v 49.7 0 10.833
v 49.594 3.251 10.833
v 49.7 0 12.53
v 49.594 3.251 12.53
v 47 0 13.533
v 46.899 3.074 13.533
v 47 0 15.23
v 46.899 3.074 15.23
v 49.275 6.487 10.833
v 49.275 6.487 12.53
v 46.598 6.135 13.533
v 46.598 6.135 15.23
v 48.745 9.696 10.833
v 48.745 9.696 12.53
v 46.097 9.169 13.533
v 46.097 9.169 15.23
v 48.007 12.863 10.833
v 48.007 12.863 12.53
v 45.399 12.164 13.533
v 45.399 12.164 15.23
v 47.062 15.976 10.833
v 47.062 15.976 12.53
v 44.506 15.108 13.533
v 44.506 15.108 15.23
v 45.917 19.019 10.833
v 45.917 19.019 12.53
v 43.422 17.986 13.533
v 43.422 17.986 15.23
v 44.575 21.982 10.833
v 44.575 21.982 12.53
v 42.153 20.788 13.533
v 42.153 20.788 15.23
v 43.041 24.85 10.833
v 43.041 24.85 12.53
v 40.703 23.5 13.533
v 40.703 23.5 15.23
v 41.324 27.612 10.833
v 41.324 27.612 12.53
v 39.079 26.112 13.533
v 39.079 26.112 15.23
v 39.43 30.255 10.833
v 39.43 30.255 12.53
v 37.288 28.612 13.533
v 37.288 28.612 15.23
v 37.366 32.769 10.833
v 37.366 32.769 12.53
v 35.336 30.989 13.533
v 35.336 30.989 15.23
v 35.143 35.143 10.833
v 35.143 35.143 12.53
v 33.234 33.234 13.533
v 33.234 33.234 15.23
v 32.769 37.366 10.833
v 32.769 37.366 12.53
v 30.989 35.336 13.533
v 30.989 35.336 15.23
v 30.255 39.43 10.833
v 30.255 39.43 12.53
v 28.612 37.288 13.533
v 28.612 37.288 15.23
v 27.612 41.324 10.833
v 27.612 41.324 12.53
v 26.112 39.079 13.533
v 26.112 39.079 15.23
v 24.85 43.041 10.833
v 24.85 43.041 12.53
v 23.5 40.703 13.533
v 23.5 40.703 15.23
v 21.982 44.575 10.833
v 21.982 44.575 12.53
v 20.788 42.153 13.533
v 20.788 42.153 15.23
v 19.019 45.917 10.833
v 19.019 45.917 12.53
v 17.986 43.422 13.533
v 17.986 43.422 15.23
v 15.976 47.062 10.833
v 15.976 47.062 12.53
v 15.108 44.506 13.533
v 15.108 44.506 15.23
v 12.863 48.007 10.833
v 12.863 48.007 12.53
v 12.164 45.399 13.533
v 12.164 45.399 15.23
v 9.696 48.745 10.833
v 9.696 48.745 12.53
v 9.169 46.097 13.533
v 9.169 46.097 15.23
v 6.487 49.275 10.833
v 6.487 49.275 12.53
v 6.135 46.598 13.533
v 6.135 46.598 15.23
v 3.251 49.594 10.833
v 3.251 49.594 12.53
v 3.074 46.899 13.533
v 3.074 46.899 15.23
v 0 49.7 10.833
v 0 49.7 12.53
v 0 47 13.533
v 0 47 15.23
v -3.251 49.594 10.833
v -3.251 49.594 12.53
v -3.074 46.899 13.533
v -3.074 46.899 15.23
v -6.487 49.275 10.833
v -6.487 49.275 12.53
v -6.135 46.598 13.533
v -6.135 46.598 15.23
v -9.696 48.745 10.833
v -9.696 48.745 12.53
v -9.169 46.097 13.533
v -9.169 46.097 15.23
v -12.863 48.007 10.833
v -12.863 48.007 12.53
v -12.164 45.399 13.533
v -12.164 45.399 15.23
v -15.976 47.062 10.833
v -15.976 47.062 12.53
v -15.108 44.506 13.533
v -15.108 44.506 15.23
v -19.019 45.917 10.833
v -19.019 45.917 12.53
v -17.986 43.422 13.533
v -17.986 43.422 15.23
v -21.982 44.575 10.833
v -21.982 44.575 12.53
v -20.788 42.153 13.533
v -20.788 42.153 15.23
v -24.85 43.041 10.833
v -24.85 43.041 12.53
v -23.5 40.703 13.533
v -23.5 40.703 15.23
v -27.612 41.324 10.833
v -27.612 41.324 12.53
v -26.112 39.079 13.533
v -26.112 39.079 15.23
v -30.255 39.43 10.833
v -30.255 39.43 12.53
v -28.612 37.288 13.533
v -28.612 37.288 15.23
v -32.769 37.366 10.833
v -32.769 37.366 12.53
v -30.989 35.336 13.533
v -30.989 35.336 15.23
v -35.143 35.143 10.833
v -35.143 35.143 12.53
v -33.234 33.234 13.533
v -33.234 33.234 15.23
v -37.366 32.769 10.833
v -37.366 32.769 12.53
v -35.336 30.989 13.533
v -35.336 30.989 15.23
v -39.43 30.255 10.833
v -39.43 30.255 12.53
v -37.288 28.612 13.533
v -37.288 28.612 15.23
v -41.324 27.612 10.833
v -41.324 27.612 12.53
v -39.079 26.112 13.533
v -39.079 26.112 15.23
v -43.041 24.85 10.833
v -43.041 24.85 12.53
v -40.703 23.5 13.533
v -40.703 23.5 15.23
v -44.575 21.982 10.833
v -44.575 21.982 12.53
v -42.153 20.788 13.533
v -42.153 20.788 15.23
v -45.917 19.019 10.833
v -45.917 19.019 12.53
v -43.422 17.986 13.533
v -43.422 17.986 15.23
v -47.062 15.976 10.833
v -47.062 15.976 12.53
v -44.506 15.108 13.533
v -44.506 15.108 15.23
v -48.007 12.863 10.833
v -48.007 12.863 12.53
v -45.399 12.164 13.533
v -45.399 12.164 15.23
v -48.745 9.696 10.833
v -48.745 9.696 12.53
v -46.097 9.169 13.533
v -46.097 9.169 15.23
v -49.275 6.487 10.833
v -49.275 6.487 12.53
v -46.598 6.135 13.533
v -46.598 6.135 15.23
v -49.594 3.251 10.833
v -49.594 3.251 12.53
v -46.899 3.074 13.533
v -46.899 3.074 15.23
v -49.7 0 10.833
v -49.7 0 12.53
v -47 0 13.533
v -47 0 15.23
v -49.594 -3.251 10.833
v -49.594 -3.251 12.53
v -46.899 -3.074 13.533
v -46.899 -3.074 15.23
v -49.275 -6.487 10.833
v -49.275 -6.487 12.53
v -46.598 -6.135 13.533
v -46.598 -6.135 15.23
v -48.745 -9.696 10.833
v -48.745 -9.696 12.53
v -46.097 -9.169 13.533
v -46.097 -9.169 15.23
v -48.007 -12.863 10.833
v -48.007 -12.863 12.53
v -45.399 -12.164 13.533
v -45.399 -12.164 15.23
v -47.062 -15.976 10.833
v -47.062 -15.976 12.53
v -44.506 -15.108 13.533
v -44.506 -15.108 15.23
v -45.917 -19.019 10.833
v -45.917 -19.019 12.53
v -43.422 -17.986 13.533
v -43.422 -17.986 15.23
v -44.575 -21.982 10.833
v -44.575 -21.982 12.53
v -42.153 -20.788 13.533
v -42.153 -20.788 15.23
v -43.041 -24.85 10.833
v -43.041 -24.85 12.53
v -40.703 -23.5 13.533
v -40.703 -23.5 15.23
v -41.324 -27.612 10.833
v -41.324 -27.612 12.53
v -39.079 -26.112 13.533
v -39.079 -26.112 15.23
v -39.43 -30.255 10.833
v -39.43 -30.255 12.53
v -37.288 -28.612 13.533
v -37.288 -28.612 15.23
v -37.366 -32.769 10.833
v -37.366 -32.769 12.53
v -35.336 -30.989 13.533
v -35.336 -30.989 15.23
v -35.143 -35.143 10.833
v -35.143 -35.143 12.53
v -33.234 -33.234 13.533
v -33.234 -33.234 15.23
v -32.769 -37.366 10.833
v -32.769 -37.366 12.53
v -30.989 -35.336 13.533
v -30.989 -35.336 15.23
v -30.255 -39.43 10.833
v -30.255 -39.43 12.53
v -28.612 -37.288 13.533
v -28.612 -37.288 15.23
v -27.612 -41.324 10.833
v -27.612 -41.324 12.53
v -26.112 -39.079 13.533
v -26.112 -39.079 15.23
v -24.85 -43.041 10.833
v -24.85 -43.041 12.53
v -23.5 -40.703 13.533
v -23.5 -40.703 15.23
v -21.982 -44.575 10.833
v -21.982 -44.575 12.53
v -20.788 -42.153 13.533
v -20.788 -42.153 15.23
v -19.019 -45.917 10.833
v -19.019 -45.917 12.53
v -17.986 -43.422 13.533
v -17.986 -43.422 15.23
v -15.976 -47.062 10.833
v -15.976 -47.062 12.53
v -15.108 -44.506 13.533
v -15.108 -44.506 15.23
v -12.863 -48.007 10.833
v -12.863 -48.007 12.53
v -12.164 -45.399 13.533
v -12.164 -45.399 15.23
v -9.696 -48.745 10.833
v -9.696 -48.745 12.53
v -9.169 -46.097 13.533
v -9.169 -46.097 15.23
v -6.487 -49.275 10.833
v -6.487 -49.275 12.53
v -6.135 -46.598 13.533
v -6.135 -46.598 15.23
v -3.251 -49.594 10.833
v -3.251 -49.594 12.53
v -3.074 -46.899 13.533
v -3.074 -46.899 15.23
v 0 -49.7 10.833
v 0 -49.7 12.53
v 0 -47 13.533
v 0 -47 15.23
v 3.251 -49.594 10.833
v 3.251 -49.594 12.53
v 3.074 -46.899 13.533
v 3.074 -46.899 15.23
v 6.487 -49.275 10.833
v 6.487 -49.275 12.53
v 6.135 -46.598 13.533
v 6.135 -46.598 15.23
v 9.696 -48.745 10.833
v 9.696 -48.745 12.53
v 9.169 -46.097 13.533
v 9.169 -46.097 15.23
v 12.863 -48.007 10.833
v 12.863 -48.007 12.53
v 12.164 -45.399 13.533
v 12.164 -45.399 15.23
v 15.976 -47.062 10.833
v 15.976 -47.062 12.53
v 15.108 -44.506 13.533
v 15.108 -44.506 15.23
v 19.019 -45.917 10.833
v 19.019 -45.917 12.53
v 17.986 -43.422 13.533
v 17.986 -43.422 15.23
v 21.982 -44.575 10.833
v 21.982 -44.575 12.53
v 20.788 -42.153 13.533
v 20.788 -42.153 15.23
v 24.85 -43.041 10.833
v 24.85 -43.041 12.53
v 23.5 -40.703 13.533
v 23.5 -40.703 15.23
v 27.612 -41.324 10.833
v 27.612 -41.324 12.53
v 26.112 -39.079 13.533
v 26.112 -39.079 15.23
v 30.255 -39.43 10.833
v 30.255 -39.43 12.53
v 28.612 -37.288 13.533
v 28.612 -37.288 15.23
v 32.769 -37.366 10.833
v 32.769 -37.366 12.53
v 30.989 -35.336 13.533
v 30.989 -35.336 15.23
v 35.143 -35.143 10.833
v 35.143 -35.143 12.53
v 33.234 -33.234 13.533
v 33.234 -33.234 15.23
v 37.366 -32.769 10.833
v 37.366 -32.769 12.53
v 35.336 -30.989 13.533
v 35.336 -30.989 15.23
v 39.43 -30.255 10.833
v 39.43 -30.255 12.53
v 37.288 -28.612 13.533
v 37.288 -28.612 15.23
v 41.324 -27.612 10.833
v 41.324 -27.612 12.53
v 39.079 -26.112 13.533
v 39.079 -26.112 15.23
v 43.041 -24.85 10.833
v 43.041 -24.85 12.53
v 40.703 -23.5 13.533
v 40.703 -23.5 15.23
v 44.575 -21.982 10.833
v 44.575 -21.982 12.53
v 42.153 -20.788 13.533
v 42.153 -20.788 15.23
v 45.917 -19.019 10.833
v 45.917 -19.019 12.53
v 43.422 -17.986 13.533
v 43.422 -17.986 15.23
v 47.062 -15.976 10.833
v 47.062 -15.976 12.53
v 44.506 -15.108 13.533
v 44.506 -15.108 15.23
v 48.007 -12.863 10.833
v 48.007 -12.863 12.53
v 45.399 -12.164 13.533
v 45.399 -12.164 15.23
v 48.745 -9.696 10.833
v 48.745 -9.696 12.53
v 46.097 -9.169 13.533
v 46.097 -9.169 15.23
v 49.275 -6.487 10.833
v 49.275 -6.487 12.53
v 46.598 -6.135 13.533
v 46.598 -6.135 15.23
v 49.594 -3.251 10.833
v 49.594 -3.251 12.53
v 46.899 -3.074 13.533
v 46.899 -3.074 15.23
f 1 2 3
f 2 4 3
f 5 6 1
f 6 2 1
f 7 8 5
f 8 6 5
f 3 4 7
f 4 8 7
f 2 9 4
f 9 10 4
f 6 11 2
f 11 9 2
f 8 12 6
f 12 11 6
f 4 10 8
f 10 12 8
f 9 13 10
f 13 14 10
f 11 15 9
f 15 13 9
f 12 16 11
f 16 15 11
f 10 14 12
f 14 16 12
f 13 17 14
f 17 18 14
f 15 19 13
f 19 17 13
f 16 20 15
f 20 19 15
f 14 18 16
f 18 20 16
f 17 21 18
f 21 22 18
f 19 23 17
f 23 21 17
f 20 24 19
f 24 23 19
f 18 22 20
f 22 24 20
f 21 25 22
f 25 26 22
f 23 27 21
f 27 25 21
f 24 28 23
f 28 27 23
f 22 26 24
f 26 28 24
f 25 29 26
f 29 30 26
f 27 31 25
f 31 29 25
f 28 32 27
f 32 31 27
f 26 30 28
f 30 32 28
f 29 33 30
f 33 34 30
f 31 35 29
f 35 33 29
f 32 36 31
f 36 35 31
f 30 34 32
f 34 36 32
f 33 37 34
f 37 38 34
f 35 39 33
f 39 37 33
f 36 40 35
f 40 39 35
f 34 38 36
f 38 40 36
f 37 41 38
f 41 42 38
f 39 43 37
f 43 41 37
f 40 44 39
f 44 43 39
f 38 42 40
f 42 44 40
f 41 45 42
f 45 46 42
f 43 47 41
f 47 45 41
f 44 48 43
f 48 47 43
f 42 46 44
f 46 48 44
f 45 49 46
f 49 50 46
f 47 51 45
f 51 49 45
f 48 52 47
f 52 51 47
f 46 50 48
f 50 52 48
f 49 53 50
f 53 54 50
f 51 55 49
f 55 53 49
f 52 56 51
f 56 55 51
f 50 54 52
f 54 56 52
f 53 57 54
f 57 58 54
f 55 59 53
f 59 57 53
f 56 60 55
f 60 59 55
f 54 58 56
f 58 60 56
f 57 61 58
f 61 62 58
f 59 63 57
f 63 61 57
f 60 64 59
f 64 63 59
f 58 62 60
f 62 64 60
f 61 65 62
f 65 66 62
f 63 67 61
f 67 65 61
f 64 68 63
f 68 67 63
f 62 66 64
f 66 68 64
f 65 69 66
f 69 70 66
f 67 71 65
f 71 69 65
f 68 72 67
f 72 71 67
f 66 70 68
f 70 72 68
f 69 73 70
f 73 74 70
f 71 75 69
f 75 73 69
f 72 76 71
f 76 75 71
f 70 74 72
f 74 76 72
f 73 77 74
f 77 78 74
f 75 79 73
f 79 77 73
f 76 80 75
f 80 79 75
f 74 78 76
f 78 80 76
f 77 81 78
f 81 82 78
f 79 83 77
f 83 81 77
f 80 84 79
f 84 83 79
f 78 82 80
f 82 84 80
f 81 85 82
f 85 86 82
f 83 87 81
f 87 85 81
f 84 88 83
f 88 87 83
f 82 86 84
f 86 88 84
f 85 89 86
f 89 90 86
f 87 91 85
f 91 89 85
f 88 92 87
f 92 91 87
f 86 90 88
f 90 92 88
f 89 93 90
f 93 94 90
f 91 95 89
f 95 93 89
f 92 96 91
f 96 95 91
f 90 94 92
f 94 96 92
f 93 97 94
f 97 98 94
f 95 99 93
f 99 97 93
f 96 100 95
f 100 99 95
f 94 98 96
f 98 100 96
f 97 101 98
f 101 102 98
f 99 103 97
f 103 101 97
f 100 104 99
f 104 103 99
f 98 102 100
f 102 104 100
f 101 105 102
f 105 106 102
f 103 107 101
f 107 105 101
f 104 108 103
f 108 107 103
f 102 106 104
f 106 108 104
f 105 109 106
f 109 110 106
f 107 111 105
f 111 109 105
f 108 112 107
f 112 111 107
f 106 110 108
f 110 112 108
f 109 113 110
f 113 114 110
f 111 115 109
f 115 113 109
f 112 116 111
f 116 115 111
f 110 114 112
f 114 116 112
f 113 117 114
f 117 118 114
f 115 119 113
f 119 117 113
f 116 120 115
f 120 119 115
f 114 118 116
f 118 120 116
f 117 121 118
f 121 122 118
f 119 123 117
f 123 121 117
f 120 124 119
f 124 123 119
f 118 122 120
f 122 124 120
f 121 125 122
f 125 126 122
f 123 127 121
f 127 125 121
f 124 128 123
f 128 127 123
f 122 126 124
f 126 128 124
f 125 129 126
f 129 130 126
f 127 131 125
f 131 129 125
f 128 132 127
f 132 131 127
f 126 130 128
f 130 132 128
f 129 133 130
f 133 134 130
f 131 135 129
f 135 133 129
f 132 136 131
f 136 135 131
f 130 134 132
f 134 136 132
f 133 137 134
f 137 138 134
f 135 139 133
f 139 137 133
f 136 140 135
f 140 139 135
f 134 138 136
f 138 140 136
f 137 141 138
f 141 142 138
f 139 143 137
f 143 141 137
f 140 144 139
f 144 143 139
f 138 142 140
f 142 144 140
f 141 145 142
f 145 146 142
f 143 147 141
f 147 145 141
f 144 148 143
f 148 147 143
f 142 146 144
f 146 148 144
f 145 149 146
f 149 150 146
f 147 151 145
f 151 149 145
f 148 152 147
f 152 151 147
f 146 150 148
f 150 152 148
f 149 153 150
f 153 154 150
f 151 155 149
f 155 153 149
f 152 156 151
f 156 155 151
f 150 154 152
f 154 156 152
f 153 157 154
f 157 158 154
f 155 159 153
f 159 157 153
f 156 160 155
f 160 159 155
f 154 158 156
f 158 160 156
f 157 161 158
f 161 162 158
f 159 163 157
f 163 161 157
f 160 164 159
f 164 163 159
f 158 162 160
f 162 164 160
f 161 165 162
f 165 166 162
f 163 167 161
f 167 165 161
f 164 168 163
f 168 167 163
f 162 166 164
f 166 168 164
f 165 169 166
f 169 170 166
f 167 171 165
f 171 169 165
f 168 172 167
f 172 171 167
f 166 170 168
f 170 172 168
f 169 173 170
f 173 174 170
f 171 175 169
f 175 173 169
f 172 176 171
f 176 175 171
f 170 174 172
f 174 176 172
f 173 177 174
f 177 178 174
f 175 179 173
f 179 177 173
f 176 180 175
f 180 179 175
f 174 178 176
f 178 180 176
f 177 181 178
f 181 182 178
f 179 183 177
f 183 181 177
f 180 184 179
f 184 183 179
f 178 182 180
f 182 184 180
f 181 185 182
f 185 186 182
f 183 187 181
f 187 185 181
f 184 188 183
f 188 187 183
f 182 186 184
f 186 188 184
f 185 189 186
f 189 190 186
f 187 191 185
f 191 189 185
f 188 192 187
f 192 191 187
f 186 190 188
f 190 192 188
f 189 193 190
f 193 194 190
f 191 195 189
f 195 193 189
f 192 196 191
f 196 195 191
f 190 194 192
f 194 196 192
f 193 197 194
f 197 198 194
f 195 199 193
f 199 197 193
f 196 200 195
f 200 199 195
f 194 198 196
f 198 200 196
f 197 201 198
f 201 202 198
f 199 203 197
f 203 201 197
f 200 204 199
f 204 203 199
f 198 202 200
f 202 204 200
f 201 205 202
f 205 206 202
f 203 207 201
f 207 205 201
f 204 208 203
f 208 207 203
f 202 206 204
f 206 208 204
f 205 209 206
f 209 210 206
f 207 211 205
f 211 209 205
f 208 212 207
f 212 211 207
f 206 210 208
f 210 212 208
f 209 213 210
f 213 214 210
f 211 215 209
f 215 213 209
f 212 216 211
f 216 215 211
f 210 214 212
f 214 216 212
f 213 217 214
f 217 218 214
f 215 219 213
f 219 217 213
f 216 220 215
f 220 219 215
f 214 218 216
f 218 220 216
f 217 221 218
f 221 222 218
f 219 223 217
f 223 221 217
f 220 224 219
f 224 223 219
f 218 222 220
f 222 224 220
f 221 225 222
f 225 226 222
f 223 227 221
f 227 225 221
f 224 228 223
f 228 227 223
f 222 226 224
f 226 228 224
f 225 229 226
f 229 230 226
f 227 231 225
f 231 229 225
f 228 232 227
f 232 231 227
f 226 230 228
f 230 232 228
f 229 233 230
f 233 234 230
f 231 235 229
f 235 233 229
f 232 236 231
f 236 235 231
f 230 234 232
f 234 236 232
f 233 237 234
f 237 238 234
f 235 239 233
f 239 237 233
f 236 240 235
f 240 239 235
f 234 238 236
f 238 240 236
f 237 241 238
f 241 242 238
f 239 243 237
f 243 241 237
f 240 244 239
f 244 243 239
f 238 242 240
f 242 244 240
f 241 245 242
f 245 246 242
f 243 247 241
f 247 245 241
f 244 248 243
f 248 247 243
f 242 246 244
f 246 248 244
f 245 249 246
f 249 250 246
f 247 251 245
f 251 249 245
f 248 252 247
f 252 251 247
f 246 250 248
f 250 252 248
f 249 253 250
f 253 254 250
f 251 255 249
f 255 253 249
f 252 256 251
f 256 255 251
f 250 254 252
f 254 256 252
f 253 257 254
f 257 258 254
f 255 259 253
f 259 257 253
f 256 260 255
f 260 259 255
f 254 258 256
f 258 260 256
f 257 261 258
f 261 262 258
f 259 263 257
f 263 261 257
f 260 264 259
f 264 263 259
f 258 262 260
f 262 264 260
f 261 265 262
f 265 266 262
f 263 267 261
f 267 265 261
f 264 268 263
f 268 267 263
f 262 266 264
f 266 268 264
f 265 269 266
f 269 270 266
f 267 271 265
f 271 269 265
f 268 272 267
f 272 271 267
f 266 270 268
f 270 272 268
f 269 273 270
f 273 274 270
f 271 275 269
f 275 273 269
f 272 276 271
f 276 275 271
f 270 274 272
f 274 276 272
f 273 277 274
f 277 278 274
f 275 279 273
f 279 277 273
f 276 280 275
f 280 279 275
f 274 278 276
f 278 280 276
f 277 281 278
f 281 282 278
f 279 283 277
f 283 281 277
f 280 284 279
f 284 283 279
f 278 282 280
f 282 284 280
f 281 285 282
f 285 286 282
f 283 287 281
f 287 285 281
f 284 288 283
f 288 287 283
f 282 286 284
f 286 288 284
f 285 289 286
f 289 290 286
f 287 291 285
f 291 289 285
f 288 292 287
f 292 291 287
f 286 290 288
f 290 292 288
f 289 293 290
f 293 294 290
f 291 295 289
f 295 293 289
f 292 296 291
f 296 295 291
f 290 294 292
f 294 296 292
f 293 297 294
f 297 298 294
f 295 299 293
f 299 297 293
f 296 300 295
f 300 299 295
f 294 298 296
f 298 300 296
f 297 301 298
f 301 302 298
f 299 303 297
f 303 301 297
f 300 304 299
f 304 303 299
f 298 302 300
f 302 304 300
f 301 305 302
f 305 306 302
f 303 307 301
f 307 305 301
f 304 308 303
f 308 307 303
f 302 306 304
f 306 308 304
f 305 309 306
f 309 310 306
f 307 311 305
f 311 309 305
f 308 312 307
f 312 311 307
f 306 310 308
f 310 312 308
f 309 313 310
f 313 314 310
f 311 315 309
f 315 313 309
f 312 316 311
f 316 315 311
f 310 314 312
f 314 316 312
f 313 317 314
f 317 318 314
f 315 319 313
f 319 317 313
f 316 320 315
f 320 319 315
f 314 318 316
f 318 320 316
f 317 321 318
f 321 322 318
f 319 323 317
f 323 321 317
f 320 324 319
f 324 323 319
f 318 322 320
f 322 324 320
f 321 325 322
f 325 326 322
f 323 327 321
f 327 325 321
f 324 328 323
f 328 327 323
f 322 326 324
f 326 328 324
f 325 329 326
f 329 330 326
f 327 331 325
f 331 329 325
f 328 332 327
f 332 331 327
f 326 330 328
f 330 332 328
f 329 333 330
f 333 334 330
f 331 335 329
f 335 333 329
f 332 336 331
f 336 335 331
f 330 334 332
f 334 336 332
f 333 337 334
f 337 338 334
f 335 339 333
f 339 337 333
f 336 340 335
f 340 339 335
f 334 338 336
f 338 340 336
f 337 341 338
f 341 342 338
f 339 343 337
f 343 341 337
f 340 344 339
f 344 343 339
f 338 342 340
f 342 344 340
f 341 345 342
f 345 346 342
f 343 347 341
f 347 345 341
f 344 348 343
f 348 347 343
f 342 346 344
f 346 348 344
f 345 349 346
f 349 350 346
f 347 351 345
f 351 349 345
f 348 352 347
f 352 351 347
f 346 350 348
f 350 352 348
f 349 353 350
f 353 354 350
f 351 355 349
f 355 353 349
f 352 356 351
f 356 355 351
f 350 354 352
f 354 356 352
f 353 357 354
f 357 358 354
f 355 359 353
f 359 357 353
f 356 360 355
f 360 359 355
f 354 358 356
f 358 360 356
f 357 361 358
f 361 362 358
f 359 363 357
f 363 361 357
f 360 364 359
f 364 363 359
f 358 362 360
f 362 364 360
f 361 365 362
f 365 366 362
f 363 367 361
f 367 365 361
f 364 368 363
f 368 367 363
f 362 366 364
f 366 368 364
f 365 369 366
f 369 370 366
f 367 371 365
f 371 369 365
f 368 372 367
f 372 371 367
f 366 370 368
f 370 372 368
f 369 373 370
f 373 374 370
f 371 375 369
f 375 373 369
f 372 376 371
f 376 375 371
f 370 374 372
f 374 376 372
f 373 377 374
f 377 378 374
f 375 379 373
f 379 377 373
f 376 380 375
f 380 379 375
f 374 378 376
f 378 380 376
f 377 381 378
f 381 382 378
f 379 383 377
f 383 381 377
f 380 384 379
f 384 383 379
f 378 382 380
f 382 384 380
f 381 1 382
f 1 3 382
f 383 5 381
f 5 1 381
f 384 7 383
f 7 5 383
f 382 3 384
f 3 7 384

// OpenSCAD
include <../lib/servo-duct-manifold-lib.scad>;
$fn = 96;
sensor_section_gasket();
